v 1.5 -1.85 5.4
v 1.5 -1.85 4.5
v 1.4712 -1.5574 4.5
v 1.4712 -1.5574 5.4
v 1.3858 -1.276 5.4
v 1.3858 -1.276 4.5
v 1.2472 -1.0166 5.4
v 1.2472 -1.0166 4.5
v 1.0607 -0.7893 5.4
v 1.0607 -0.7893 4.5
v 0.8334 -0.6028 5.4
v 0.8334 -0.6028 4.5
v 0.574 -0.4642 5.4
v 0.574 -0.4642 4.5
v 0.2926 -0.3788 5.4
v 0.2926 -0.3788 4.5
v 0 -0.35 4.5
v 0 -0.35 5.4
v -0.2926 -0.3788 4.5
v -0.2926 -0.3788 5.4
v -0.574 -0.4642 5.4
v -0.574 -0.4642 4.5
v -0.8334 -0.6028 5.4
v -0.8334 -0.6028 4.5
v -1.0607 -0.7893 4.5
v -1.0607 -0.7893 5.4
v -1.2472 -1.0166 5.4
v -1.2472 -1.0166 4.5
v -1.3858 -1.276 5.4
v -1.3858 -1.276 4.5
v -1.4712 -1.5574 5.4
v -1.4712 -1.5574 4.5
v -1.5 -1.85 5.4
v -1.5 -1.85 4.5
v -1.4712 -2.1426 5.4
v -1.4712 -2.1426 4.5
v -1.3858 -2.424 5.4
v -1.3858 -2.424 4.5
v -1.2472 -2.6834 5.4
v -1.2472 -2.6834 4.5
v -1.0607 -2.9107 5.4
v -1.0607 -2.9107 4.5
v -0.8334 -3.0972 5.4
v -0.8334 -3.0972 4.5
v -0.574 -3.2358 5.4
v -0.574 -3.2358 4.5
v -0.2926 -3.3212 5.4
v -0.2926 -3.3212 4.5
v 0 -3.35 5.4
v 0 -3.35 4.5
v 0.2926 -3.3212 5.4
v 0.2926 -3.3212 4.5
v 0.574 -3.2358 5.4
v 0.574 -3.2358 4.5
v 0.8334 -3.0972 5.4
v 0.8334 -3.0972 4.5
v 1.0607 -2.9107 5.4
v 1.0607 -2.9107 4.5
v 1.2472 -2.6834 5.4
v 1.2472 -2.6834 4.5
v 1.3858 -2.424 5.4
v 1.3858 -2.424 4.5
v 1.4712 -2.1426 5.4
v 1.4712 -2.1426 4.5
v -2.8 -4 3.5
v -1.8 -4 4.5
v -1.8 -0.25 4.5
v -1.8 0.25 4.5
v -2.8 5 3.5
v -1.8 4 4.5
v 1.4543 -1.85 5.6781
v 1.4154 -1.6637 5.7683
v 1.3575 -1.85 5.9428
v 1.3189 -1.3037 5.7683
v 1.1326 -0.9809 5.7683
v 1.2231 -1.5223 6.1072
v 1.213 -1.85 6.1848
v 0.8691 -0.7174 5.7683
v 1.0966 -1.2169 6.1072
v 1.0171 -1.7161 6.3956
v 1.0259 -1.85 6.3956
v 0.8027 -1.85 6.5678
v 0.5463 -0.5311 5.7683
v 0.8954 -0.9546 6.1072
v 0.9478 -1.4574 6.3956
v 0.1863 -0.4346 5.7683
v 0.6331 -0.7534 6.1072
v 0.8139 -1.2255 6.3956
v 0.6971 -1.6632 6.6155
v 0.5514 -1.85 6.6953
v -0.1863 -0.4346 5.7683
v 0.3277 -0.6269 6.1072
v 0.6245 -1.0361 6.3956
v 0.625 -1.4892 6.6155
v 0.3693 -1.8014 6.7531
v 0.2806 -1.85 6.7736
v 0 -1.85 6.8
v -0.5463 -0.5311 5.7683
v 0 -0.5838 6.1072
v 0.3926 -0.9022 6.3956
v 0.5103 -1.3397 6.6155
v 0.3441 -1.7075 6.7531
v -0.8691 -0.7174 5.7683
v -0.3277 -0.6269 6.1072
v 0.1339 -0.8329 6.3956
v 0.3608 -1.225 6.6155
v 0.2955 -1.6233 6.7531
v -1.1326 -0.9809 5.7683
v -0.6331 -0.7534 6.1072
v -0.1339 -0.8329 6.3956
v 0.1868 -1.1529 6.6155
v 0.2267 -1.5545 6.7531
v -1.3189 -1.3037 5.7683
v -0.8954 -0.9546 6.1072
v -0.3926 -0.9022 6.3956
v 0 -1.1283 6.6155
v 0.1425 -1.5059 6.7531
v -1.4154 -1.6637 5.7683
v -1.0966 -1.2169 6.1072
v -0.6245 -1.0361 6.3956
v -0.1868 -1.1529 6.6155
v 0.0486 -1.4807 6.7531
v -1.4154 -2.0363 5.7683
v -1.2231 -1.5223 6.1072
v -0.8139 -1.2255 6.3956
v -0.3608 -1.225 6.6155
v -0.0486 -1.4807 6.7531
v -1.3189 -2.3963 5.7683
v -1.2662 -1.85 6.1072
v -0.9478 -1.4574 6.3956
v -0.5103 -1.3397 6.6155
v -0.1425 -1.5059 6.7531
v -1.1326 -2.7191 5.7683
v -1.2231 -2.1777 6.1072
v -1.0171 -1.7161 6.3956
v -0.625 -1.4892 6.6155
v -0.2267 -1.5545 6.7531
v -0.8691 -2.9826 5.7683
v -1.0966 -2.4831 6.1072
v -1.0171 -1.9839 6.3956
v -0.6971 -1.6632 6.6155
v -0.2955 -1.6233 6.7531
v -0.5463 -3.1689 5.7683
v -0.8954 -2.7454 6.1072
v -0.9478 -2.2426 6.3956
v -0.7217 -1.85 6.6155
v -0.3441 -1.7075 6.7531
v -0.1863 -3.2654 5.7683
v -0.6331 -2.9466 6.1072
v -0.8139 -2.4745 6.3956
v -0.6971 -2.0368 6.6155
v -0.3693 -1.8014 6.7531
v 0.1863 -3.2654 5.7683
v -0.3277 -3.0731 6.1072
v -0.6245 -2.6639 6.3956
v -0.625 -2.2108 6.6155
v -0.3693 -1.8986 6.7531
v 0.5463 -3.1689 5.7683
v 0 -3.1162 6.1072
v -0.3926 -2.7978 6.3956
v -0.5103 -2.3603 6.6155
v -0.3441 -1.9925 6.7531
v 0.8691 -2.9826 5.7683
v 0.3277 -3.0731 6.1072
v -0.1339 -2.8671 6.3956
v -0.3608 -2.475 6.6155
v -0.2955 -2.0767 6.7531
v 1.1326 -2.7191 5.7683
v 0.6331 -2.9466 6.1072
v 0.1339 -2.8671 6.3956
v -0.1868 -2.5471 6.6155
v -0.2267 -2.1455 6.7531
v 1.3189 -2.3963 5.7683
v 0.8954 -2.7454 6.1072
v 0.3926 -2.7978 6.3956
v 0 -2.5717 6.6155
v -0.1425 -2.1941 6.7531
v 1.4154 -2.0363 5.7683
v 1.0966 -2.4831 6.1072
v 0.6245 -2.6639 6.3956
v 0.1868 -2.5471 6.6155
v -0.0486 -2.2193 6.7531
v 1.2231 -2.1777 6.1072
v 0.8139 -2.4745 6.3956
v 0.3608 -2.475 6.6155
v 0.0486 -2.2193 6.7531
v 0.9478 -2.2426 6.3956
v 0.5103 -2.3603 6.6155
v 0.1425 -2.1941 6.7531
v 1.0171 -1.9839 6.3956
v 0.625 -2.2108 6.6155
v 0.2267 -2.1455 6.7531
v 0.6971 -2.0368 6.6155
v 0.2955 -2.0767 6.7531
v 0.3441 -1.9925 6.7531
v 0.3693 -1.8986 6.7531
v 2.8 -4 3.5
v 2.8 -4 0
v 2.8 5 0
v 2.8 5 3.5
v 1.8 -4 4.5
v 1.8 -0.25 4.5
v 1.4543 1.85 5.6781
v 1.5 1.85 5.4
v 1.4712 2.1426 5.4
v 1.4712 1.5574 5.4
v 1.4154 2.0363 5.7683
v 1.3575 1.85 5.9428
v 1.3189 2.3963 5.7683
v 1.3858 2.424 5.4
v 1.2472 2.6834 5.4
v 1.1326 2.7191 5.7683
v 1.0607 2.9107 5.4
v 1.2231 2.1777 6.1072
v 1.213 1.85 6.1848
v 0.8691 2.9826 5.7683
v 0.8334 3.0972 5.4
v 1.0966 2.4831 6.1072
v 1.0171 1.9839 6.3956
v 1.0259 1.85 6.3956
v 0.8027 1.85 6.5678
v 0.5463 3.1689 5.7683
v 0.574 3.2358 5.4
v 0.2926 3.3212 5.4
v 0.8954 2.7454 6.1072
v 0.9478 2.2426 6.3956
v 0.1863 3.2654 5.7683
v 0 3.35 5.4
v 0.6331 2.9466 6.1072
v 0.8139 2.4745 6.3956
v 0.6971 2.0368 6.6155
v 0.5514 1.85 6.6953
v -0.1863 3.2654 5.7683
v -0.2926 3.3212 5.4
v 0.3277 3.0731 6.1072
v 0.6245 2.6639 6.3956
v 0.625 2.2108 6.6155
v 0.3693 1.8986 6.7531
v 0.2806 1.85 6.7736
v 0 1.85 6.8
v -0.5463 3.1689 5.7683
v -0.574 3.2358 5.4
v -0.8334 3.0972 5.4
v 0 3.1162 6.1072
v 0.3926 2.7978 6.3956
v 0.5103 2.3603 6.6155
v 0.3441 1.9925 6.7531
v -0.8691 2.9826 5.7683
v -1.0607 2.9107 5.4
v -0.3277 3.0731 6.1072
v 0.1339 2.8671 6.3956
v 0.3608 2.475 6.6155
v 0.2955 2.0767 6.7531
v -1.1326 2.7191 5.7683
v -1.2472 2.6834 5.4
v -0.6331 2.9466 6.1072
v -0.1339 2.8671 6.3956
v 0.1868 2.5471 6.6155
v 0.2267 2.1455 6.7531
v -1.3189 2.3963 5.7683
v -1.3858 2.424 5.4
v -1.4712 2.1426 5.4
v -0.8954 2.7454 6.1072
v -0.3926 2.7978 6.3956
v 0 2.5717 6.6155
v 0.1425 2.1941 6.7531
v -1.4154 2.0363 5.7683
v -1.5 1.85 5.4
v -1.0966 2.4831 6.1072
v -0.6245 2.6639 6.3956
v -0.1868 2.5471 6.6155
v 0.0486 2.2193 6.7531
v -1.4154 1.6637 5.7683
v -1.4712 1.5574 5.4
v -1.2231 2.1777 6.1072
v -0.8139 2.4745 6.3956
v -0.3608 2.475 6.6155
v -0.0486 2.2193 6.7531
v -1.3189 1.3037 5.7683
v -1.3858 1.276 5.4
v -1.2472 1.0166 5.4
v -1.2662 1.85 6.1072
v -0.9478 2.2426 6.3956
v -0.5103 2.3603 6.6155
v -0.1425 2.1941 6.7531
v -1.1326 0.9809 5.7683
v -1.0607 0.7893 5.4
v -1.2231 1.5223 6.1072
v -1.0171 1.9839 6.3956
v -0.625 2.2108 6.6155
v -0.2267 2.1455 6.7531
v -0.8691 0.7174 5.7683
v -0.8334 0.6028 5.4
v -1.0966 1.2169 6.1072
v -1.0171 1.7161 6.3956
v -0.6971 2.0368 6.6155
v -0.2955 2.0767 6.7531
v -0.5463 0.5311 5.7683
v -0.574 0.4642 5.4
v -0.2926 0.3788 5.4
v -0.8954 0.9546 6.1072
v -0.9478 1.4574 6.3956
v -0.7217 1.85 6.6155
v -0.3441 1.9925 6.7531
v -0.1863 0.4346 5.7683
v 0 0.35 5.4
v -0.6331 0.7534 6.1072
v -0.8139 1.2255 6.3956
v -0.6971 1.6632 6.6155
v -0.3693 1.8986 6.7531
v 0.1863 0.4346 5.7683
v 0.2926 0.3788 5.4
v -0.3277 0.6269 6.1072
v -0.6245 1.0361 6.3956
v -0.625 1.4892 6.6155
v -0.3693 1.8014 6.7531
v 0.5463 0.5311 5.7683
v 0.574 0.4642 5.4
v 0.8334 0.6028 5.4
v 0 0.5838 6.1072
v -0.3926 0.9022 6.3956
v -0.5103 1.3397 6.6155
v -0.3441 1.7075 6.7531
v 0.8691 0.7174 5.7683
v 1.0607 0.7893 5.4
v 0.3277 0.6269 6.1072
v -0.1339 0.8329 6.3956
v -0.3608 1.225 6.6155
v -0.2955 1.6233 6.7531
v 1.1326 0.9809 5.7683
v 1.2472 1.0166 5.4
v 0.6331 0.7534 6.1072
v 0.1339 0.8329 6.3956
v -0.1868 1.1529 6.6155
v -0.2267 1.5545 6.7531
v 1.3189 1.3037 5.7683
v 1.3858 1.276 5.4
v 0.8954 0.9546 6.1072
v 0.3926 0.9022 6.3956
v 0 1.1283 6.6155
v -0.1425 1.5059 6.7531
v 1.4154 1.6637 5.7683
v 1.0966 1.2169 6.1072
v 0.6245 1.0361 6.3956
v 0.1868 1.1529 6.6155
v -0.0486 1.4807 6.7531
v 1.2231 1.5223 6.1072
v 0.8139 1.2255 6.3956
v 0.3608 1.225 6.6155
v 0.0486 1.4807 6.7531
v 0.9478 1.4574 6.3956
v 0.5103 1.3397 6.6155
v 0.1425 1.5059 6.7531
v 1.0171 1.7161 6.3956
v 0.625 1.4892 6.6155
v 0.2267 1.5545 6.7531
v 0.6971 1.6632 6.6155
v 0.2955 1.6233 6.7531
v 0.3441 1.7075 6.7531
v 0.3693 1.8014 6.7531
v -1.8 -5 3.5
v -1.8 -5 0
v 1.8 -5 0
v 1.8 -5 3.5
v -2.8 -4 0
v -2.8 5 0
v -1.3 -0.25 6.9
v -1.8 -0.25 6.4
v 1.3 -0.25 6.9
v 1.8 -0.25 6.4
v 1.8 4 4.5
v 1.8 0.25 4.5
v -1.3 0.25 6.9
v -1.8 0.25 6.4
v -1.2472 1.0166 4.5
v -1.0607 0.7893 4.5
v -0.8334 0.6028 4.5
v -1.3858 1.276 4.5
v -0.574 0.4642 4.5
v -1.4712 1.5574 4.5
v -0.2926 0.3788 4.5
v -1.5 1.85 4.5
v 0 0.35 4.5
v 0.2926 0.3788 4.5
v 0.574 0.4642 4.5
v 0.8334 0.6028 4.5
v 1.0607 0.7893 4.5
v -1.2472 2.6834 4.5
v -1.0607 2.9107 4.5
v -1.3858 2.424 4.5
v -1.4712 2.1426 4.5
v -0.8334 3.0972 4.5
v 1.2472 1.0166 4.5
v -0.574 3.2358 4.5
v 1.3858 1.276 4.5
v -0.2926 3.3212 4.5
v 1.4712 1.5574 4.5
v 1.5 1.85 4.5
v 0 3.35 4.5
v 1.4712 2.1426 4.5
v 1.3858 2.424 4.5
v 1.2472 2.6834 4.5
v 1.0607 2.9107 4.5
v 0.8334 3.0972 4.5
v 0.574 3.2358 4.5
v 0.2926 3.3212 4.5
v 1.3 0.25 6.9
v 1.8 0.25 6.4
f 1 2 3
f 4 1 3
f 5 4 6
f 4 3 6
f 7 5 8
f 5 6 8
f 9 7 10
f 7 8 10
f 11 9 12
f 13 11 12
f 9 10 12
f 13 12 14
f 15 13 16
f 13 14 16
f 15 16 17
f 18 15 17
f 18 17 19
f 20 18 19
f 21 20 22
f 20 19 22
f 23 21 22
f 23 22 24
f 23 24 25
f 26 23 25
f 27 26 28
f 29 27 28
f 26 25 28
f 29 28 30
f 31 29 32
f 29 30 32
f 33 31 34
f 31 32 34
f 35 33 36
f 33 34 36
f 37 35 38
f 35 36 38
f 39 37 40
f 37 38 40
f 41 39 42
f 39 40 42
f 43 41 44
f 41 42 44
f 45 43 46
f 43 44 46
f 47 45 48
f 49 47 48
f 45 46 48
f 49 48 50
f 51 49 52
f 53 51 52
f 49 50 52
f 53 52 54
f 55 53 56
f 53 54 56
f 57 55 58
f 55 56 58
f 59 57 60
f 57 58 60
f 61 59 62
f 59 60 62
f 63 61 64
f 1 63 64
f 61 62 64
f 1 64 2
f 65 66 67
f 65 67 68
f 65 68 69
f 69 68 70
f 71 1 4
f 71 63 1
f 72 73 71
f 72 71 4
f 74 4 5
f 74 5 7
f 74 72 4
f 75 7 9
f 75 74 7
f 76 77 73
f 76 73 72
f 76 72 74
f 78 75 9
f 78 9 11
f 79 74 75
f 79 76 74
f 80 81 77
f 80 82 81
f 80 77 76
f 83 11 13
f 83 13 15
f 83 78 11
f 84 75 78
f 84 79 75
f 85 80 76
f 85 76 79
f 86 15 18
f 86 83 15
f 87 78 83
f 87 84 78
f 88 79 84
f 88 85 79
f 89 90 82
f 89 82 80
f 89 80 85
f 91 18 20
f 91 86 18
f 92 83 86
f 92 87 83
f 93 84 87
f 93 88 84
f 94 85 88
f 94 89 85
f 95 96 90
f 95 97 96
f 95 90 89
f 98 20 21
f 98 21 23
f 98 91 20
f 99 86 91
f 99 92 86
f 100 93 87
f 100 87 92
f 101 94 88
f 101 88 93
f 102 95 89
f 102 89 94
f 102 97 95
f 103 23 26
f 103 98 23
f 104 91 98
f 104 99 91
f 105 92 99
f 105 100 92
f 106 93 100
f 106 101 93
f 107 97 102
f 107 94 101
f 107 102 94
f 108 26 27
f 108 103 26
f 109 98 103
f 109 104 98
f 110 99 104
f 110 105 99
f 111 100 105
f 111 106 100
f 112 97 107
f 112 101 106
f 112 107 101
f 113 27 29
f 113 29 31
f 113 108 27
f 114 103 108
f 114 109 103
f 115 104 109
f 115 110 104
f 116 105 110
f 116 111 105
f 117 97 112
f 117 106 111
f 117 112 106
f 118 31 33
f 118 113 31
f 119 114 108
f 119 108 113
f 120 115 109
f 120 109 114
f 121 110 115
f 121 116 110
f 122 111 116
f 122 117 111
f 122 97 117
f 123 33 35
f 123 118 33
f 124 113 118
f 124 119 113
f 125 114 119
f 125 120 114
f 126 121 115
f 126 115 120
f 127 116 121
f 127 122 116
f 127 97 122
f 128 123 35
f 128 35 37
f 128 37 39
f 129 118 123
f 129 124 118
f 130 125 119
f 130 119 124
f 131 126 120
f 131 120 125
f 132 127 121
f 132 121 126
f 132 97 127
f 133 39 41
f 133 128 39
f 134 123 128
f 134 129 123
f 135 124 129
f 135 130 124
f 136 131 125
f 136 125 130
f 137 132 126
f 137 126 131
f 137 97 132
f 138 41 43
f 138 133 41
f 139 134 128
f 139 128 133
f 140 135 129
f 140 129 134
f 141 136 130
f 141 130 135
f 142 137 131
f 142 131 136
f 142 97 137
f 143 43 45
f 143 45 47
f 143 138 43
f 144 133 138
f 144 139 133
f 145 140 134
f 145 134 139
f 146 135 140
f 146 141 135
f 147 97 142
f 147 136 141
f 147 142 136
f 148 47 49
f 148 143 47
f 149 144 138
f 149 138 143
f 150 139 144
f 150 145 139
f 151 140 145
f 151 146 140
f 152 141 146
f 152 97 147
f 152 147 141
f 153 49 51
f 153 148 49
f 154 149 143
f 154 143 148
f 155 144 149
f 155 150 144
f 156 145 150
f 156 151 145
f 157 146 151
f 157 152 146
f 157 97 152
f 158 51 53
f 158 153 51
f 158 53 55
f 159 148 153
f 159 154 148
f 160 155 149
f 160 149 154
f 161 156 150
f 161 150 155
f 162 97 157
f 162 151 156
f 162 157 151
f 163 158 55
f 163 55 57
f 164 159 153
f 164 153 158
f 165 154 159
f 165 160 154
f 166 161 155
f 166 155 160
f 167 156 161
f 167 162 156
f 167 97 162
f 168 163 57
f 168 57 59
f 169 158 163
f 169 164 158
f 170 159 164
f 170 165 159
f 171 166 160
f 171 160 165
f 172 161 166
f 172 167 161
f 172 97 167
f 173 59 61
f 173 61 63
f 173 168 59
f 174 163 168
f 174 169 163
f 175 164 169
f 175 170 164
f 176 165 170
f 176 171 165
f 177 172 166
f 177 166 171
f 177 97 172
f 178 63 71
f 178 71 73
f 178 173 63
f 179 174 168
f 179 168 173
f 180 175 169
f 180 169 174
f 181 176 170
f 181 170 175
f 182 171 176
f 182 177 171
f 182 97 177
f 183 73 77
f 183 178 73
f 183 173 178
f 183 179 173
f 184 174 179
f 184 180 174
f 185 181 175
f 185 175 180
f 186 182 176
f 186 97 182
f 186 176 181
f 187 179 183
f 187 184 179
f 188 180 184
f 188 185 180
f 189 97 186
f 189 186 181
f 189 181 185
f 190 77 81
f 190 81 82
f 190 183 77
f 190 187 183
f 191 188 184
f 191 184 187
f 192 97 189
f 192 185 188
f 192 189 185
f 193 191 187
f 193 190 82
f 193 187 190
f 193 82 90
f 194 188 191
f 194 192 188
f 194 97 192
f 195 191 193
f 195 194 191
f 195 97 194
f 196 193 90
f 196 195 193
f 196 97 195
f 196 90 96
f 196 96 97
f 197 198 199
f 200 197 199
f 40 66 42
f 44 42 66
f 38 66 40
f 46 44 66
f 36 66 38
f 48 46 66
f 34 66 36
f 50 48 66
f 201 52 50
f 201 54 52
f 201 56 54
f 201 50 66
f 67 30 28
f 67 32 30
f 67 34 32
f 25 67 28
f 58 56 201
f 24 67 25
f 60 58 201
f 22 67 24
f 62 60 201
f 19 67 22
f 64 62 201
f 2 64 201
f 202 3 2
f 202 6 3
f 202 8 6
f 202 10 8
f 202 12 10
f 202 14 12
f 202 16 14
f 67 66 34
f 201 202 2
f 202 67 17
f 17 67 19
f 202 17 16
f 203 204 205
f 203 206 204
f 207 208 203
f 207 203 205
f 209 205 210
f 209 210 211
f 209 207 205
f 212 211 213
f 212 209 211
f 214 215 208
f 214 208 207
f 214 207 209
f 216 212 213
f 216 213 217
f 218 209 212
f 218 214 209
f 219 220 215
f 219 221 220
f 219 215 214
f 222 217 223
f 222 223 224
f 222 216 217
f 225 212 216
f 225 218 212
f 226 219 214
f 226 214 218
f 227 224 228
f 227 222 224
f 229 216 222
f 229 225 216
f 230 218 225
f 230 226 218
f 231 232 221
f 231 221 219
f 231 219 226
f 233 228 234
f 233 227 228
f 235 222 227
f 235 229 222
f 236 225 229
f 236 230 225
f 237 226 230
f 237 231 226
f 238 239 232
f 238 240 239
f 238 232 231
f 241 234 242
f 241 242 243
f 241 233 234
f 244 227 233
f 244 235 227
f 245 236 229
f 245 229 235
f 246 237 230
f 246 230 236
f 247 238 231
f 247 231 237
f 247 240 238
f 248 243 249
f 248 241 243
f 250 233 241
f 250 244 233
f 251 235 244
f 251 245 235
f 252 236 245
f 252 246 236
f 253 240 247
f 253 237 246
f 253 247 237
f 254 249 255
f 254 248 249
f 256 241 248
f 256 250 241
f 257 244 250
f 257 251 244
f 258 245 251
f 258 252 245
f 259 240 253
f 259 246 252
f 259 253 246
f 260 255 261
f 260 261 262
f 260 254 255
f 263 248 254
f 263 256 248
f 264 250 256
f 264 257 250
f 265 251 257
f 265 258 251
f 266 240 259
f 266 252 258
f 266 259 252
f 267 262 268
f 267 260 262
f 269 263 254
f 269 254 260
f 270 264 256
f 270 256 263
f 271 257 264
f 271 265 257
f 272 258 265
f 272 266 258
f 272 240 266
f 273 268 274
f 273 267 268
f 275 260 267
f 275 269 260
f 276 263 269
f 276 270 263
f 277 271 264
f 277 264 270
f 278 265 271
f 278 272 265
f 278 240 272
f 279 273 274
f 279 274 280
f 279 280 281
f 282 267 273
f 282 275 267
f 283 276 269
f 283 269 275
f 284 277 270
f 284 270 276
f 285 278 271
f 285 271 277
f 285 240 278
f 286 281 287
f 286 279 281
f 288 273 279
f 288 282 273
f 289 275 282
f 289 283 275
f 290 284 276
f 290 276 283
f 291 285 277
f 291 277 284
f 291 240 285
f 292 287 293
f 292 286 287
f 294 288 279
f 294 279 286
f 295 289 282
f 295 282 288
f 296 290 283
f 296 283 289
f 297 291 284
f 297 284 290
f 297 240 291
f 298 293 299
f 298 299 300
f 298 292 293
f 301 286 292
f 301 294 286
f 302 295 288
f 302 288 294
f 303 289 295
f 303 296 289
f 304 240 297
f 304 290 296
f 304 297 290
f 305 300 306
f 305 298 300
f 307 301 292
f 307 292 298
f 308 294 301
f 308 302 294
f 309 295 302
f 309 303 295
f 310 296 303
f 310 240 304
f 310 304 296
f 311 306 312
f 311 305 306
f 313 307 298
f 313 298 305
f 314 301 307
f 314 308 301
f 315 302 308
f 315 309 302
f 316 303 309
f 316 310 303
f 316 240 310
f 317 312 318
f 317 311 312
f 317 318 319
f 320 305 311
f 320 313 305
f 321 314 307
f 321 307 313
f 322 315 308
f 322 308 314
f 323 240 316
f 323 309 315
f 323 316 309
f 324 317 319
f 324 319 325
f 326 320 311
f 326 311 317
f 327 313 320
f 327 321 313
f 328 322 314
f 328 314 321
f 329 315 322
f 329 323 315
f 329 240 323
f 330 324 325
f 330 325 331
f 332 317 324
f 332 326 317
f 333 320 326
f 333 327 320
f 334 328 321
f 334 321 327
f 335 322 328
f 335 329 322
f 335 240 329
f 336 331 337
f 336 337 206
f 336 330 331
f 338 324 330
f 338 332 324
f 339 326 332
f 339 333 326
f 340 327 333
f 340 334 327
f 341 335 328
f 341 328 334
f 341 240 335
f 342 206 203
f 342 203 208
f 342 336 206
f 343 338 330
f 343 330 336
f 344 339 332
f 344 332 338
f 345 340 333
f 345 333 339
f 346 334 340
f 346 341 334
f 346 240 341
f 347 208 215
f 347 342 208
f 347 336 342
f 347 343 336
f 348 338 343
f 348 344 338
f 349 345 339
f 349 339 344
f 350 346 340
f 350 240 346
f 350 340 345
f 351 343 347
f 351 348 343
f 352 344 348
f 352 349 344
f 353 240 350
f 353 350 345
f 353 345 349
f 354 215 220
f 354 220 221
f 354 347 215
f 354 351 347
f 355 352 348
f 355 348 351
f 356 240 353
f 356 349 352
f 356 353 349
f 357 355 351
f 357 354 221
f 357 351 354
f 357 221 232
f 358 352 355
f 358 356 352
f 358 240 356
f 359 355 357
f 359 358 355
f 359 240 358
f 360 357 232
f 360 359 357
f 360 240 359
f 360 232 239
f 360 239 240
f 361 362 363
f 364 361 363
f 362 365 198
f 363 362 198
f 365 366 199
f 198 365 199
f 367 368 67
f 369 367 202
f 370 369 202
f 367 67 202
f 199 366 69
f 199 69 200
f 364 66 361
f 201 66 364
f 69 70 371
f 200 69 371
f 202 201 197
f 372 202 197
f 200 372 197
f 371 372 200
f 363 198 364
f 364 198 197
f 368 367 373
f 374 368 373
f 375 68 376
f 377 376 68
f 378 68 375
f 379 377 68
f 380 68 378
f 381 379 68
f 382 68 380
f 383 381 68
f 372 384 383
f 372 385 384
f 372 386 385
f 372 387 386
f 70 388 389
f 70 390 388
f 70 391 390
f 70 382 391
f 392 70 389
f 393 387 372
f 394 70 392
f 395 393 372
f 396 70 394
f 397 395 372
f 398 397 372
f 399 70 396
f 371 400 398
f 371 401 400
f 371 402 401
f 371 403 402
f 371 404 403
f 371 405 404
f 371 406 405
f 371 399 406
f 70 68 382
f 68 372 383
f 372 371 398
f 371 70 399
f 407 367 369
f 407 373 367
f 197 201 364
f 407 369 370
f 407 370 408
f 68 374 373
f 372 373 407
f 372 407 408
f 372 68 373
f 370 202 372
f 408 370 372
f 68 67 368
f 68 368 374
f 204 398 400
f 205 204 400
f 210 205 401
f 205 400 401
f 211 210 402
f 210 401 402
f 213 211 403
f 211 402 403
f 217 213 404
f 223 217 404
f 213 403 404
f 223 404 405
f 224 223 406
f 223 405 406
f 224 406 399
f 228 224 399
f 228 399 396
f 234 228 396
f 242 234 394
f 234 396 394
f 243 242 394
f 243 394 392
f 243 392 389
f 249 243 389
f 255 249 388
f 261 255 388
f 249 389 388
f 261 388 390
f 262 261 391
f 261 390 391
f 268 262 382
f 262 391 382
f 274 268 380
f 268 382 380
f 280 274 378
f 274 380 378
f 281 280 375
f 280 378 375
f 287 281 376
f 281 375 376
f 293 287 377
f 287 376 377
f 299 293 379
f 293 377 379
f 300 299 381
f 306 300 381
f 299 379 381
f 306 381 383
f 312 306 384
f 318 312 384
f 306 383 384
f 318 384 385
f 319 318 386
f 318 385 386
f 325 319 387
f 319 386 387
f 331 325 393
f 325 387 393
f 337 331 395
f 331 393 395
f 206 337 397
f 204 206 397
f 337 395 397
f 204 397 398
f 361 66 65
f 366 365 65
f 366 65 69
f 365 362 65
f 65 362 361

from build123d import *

# Parameters (mm, degrees)
SKETCH1_W           = 5.6
SKETCH1_H           = 10
BOSS_EXTRUDE1_DEPTH = 4.5
CHAMFER1_SIZE       = 1
SKETCH2_R           = 1.5
BOSS_EXTRUDE2_DEPTH = 0.9
SKETCH3_W           = 3.6
SKETCH3_H           = 0.5
BOSS_EXTRUDE3_DEPTH = 2.4
CHAMFER2_SIZE       = 0.5


# Read off the part's stored shape, not the designer's step: Dome1, Dome2
with BuildPart() as part:
    # Sketch1 → Boss-Extrude1 (new body)
    with BuildSketch(Plane.XY):
        Rectangle(SKETCH1_W, SKETCH1_H)
    extrude(amount=BOSS_EXTRUDE1_DEPTH)

    # Chamfer1
    chamfer1_edges = [part.edges().sort_by_distance(p)[0] for p in [
        (-2.8, 0, 4.5),
        (0, -5, 4.5),
        (2.8, 0, 4.5),
        (0, 5, 4.5),
        (2.8, -5, 2.25),
        (-2.8, -5, 2.25),
    ]]
    chamfer(chamfer1_edges, length=CHAMFER1_SIZE)

    # Sketch2 → Boss-Extrude2 (add)
    with BuildSketch(Plane.XY.offset(4.5)):
        with Locations((0, 1.85)):
            Circle(SKETCH2_R)
        with Locations((0, -1.85)):
            Circle(SKETCH2_R)
    extrude(amount=BOSS_EXTRUDE2_DEPTH)

    # Dome1 outline → Dome1 (revolve)
    with BuildSketch(Plane.XZ.offset(-1.85)):
        with BuildLine():
            Line((0, 5.4), (1.5, 5.399999999))
            ThreePointArc((1.5, 5.399999999), (1.025914227, 6.395622385), (0, 6.8))
            Line((0, 6.8), (0, 5.4))
        make_face()
    revolve(axis=Axis((0, 1.85, 0), (0, 0, 1)))

    # Dome2 outline → Dome2 (revolve)
    with BuildSketch(Plane.XZ.offset(1.85)):
        with BuildLine():
            Line((0, 5.4), (1.5, 5.399999999))
            ThreePointArc((1.5, 5.399999999), (1.025914227, 6.395622385), (0, 6.8))
            Line((0, 6.8), (0, 5.4))
        make_face()
    revolve(axis=Axis((0, -1.85, 0), (0, 0, 1)))

    # Sketch3 → Boss-Extrude3 (add)
    with BuildSketch(Plane.XY.offset(4.5)):
        Rectangle(SKETCH3_W, SKETCH3_H)
    extrude(amount=BOSS_EXTRUDE3_DEPTH)

    # Chamfer2
    chamfer2_edges = [part.edges().sort_by_distance(p)[0] for p in [
        (1.8, 0, 6.9),
        (-1.8, 0, 6.9),
    ]]
    chamfer(chamfer2_edges, length=CHAMFER2_SIZE)


solid = part.part
